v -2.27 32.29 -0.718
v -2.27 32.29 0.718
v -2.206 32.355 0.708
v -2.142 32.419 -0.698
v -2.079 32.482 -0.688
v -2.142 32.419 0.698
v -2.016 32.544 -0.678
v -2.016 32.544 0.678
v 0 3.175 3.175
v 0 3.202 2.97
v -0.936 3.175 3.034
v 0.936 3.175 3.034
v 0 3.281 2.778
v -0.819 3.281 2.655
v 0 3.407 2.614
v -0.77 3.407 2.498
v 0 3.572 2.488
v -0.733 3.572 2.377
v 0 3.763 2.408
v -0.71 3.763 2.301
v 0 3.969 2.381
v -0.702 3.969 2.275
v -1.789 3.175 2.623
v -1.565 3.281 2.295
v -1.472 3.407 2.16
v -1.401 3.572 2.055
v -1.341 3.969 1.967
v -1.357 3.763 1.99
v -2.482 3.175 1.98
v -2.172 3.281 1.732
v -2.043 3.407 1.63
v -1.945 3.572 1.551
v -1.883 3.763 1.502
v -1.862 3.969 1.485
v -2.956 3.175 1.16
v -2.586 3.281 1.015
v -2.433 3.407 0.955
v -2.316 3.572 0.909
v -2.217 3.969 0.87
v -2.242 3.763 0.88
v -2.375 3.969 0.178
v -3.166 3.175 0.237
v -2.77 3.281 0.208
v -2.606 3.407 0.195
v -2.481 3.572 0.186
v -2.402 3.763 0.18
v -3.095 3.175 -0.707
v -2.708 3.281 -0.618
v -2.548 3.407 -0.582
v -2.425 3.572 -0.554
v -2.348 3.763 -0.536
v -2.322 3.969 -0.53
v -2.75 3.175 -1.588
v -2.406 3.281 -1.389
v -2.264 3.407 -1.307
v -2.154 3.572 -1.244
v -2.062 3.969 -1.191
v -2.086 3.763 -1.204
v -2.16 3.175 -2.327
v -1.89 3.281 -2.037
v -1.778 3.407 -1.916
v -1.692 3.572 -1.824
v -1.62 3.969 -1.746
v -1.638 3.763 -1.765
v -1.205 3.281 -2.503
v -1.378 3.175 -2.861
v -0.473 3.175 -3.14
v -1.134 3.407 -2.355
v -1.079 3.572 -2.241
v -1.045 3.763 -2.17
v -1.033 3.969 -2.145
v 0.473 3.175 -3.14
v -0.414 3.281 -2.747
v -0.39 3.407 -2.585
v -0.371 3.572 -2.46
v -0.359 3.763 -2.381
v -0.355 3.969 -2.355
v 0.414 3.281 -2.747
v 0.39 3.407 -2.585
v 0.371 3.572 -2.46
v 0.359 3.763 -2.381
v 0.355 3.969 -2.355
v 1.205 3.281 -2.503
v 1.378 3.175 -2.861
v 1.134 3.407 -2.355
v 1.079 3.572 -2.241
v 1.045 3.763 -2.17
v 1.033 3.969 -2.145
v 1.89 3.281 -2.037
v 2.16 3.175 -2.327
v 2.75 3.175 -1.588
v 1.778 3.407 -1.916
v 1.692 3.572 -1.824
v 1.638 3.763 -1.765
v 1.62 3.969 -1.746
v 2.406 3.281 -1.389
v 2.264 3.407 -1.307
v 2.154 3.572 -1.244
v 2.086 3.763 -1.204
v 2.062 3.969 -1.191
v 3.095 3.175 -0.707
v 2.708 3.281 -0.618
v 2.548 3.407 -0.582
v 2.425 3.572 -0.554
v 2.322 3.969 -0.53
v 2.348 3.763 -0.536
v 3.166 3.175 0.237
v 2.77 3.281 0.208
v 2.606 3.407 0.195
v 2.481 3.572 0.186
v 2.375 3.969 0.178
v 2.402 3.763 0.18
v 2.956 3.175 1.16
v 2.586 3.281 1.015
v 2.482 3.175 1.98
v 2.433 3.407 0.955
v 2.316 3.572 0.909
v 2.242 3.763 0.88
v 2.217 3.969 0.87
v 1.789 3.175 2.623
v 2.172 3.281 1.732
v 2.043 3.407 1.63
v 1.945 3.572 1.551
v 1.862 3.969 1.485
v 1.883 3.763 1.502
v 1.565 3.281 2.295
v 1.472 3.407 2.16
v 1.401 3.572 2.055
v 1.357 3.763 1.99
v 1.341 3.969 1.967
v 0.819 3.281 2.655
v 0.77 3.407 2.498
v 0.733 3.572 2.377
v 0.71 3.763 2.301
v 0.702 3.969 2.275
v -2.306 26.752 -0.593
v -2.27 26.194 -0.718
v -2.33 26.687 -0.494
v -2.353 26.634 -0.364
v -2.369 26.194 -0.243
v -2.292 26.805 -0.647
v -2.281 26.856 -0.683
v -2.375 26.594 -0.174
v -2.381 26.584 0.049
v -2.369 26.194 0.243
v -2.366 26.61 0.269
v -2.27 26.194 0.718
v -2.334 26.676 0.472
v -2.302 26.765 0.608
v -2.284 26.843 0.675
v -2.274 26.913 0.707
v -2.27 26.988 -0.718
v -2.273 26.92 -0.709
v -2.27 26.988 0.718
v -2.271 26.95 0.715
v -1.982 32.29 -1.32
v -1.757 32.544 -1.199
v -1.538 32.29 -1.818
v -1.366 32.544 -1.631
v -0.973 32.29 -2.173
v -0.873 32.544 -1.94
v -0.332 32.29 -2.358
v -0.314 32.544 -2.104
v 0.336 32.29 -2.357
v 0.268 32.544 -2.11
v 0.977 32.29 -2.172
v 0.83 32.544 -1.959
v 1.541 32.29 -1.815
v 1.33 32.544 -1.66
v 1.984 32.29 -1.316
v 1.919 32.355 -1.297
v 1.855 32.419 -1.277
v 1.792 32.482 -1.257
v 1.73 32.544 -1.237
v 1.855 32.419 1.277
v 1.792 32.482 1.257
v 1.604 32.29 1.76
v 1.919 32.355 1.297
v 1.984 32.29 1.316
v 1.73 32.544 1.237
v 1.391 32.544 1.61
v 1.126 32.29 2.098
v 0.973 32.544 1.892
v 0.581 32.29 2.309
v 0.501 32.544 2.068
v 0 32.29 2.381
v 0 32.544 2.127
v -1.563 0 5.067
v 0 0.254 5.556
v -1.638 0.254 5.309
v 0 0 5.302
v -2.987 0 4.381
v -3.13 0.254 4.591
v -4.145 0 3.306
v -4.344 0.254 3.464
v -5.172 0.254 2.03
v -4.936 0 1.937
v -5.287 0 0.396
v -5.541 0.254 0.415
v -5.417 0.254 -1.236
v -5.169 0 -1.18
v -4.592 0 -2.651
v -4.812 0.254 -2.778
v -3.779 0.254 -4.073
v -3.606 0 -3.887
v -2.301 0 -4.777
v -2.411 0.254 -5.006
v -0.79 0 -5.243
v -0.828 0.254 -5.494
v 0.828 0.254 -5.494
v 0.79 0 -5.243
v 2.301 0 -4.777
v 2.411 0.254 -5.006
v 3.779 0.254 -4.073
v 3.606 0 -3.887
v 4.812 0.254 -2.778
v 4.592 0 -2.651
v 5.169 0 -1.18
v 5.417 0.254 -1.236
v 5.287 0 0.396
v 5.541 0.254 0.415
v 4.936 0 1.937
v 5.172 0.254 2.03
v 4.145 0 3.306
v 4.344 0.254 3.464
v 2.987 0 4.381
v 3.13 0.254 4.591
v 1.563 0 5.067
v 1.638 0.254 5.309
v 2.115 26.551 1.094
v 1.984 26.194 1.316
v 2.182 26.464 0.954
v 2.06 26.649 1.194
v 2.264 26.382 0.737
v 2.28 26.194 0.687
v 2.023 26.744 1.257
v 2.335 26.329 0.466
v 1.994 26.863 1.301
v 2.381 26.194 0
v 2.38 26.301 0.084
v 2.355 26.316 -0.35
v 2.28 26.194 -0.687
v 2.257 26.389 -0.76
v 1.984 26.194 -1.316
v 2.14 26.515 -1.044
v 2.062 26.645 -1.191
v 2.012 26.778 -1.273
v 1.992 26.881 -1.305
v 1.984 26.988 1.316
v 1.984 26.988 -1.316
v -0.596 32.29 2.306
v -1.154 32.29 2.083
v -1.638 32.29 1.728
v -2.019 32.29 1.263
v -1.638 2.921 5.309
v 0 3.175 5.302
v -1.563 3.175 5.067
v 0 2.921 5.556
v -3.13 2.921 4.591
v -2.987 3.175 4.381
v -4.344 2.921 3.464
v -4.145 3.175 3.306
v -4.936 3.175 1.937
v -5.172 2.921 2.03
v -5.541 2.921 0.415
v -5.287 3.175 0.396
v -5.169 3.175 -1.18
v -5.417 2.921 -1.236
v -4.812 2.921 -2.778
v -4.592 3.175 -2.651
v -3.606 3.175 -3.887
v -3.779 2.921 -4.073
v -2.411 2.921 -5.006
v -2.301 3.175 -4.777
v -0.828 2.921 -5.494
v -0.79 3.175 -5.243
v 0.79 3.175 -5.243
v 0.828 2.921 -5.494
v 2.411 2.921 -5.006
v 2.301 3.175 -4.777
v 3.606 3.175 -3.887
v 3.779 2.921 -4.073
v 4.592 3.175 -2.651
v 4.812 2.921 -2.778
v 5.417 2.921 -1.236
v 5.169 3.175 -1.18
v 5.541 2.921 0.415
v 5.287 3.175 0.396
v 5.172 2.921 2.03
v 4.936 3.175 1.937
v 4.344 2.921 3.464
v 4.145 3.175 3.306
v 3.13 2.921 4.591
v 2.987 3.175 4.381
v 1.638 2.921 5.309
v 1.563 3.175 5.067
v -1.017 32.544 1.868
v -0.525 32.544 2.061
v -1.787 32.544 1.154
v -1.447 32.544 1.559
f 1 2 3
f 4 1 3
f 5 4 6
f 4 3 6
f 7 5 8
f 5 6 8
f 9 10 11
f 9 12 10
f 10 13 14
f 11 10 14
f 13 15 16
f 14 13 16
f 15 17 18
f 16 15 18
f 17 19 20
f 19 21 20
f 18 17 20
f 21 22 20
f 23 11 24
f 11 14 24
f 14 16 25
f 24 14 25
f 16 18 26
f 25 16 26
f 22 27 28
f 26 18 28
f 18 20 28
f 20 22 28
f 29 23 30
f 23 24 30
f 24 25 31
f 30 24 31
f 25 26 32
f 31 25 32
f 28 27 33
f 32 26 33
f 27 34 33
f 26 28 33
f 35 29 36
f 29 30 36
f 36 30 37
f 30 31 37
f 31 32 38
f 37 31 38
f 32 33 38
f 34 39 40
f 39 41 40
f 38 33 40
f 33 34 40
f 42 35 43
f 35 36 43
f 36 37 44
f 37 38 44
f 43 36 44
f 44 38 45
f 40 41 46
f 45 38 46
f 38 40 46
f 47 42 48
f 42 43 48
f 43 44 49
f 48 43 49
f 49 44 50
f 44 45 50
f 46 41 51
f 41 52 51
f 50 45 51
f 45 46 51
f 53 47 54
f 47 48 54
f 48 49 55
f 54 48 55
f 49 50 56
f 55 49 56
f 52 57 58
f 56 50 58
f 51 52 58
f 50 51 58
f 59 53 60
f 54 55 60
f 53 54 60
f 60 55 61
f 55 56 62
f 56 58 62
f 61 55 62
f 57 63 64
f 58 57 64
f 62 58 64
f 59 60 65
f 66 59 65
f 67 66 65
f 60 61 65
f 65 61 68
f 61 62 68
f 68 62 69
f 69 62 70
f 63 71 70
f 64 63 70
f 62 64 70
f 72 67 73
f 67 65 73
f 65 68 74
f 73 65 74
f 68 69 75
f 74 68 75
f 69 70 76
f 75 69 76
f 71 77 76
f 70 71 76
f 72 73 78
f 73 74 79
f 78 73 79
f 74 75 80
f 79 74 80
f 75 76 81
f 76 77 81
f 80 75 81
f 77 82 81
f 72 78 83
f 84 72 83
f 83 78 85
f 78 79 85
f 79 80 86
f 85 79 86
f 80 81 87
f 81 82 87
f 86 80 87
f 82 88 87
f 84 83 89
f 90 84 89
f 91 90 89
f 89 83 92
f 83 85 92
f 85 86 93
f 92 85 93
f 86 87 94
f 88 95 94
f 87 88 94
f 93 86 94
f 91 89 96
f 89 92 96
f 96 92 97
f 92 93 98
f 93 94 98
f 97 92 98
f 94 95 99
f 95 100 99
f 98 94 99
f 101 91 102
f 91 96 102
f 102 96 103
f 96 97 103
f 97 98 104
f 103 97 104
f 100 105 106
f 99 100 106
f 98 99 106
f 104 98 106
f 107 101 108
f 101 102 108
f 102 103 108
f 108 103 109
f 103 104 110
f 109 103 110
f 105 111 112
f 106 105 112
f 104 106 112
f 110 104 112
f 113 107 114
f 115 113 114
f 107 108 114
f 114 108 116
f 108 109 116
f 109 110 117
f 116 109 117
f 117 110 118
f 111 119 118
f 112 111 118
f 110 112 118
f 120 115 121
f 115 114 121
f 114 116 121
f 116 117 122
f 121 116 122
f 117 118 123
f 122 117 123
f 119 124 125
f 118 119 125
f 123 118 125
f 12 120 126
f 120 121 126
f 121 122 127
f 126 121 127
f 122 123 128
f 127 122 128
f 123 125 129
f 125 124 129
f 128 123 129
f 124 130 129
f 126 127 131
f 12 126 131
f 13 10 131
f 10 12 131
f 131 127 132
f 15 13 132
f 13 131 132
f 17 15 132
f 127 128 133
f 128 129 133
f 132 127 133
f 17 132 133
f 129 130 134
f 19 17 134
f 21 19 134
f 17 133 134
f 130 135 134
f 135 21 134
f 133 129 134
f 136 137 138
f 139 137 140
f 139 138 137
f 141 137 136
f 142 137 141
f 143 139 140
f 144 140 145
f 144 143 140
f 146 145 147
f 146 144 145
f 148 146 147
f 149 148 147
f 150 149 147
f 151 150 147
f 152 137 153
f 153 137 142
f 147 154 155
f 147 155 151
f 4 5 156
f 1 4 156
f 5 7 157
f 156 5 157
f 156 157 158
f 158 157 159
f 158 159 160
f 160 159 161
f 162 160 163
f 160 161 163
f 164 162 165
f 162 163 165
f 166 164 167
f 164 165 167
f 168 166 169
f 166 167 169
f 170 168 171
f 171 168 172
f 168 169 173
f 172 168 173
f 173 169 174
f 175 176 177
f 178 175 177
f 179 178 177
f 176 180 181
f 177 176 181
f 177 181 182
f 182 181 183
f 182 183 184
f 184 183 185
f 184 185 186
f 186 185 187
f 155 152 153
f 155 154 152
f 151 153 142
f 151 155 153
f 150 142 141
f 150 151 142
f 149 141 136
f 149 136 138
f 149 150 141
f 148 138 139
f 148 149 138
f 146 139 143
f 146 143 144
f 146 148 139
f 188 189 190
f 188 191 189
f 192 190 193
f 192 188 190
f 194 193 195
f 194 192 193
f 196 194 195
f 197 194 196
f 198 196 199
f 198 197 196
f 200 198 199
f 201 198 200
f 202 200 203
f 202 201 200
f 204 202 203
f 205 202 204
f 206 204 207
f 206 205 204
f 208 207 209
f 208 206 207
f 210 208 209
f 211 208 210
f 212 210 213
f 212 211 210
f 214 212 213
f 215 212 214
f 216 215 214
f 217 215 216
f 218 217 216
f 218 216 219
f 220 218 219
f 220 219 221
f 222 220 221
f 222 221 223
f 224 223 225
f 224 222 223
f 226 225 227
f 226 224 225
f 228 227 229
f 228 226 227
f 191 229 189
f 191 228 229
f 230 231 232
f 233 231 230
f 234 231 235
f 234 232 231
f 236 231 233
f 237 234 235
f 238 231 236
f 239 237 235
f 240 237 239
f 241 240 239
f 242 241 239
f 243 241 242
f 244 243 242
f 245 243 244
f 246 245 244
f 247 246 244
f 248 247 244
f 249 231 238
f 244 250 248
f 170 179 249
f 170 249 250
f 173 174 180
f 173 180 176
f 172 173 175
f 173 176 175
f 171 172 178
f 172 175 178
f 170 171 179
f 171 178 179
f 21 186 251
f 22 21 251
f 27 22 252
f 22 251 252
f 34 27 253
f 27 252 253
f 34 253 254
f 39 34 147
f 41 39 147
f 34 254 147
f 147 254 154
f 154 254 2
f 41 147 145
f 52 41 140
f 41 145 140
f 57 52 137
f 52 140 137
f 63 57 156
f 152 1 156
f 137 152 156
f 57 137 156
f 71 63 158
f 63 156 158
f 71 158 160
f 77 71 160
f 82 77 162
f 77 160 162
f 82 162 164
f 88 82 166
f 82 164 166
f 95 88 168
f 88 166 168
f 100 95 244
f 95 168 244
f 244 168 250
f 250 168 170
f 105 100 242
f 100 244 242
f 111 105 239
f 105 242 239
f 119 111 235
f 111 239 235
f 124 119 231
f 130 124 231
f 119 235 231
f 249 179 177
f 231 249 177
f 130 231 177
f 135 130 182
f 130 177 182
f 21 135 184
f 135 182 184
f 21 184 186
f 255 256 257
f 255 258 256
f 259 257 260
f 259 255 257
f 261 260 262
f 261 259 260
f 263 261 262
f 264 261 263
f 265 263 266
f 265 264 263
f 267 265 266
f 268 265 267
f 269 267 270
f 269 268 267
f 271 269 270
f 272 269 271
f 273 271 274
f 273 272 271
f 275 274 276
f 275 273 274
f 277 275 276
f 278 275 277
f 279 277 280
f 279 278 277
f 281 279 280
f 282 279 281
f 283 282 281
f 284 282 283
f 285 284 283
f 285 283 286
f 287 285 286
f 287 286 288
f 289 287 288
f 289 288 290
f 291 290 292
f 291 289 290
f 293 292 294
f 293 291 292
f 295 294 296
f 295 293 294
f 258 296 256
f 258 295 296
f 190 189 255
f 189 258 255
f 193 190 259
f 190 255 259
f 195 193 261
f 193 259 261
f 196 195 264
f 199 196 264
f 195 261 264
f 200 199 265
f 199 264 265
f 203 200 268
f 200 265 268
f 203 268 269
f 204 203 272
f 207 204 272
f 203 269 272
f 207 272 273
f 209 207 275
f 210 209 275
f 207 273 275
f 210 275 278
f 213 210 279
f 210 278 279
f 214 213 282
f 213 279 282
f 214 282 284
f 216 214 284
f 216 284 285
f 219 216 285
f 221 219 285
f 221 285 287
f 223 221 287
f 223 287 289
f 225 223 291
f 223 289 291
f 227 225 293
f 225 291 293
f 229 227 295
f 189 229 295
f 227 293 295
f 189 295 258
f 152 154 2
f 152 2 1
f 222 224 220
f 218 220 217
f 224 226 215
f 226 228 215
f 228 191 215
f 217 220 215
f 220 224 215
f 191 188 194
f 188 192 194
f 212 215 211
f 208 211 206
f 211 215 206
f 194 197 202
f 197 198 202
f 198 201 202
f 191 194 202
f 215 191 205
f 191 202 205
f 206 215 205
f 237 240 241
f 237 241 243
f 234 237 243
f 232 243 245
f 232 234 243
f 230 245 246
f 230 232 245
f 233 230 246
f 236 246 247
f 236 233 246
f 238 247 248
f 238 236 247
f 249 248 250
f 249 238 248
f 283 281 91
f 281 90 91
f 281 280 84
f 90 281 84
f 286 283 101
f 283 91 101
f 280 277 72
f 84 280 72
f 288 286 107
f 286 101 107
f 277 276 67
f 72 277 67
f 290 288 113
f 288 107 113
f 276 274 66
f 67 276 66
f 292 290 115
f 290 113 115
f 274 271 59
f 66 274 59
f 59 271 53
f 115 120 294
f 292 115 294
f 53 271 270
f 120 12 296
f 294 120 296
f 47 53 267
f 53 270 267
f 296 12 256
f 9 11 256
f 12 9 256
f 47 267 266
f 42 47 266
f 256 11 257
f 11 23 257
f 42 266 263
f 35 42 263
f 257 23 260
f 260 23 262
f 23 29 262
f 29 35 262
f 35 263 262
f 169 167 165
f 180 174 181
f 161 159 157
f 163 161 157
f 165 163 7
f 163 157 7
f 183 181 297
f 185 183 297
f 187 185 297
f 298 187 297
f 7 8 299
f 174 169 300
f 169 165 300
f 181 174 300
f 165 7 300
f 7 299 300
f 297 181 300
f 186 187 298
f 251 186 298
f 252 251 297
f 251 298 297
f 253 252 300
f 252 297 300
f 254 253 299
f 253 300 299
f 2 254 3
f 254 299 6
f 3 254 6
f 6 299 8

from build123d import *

# Parameters (mm, degrees)
CUT_EXTRUDE1_DEPTH = 6.35
FILLET1_R          = 0.79375
FILLET2_R          = 0.79375
CHAMFER1_SIZE      = 0.254


with BuildPart() as part:
    # Sketch1 → Revolve1 (revolve)
    with BuildSketch(Plane.XY, mode=Mode.PRIVATE) as revolve1_sk:
        Polygon((0, 0), (5.55625, 0), (5.55625, 3.175), (2.38125, 3.175), (2.38125, 32.54375), (0, 32.54375), align=None)
    revolve(revolve1_sk.sketch.rotate(Axis((0, 3.469370861, 0), (0, -1, 0)), 90), axis=Axis((0, 3.469370861, 0), (0, -1, 0)))

    # Sketch4 → Cut-Extrude1 (cut)
    with BuildSketch(Plane(origin=(0, 32.54375, 0), x_dir=(1, 0, 0), z_dir=(0, 1, 0))):
        with BuildLine():
            Line((-2.270399729, -0.71807843), (-2.270399729, 0.71807843))
            ThreePointArc((-2.270399729, 0.71807843), (-2.38125, 0), (-2.270399729, -0.71807843))
        make_face()
        with BuildLine():
            Line((1.984375, -1.316285464), (1.984375, 1.316285464))
            ThreePointArc((1.984375, 1.316285464), (2.38125, 0), (1.984375, -1.316285464))
        make_face()
    extrude(amount=-CUT_EXTRUDE1_DEPTH, mode=Mode.SUBTRACT)

    # Fillet1
    fillet1_edges = [part.edges().sort_by_distance(p)[0] for p in [
        (0, 3.175, -2.38125),
    ]]
    fillet(fillet1_edges, radius=FILLET1_R)

    # Fillet2
    # the kernel refuses this fillet: 0.79375 mm, written as the material it adds along each edge
    with BuildSketch(Plane(origin=(1.984375, 26.19375, 3.300660464), x_dir=(0, 1, 0), z_dir=(0, 0, -1))) as fillet2_piece_1_section:
        with BuildLine():
            CenterArc((FILLET2_R, FILLET2_R), FILLET2_R, 180, 90)
            Line((0, FILLET2_R), (0, 0))
            Line((0, 0), (FILLET2_R, 0))
        make_face()
    fillet2_piece_1 = extrude(amount=6.601320927, mode=Mode.PRIVATE)
    fillet2_piece_1 = fillet2_piece_1 & Plane(origin=(0, 26.406315187, 0), x_dir=(0, 0, 1), z_dir=(0, 1, 0)) * Cylinder(2.38125, 17, mode=Mode.PRIVATE)
    add(fillet2_piece_1)
    with BuildSketch(Plane(origin=(-2.270399729, 26.19375, 2.70245343), x_dir=(0, 1, 0), z_dir=(0, 0, -1))) as fillet2_piece_2_section:
        with BuildLine():
            CenterArc((FILLET2_R, -FILLET2_R), FILLET2_R, 90, 90)
            Line((0, -FILLET2_R), (0, 0))
            Line((0, 0), (FILLET2_R, 0))
        make_face()
    fillet2_piece_2 = extrude(amount=5.404906861, mode=Mode.PRIVATE)
    fillet2_piece_2 = fillet2_piece_2 & Plane(origin=(0, 26.476974143, 0), x_dir=(0, 0, 1), z_dir=(0, 1, 0)) * Cylinder(2.38125, 14, mode=Mode.PRIVATE)
    add(fillet2_piece_2)

    # Chamfer1
    # the kernel refuses this chamfer: 0.254 mm, written as the material it takes off along each edge
    with BuildSketch(Plane(origin=(0, 32.54375, 0), x_dir=(-0.9994949156693064, 0, -0.03177913704312948), z_dir=(-0.03177913704312948, 0, 0.9994949156693064))) as chamfer1_piece_1:
        Polygon((2.38125, CHAMFER1_SIZE), (2.38125 - CHAMFER1_SIZE, 0), (2.38125, 0), align=None)
    revolve(axis=Axis((0, 32.54375, 0), (0, -1, 0)), revolution_arc=160.351494941, mode=Mode.SUBTRACT)
    with BuildSketch(Plane(origin=(0, 32.54375, 0), x_dir=(0, 0, 1), z_dir=(1, 0, 0))) as chamfer1_piece_2:
        Polygon((2.38125, CHAMFER1_SIZE), (2.38125 - CHAMFER1_SIZE, 0), (2.38125, 0), align=None)
    revolve(axis=Axis((0, 32.54375, 0), (0, -1, 0)), revolution_arc=88.170020766, mode=Mode.SUBTRACT)
    with BuildSketch(Plane(origin=(1.984375, 32.54375, 1.969492943), x_dir=(-0.9996219169112972, 0.027495876610573698, 0), z_dir=(0, 0, -1))) as chamfer1_piece_3:
        Polygon((CHAMFER1_SIZE * 0.999621916911, -CHAMFER1_SIZE * 0.0274958766106), (-CHAMFER1_SIZE * 0.0274958766106, -CHAMFER1_SIZE * 0.999621916911), (0, 0), align=None)
    extrude(amount=3.938985885, mode=Mode.SUBTRACT)
    with BuildSketch(Plane(origin=(-2.270399729, 32.54375, 1.371285909), x_dir=(-0.027495876610587867, -0.9996219169112968, 0), z_dir=(0, 0, -1))) as chamfer1_piece_4:
        Polygon((CHAMFER1_SIZE * 0.999621916911, -CHAMFER1_SIZE * 0.0274958766106), (-CHAMFER1_SIZE * 0.0274958766106, -CHAMFER1_SIZE * 0.999621916911), (0, 0), align=None)
    extrude(amount=2.742571819, mode=Mode.SUBTRACT)
    with BuildSketch(Plane(origin=(0, 3.175, 0), x_dir=(0, 0, 1), z_dir=(1, 0, 0))) as chamfer1_piece_5:
        Polygon((5.55625 - CHAMFER1_SIZE, 0), (5.55625, CHAMFER1_SIZE), (5.55625, 0), align=None)
    revolve(axis=Axis((0, 3.175, 0), (0, -1, 0)), mode=Mode.SUBTRACT)
    with BuildSketch(Plane(origin=(0, 0, 0), x_dir=(0, 0, 1), z_dir=(1, 0, 0))) as chamfer1_piece_6:
        Polygon((5.55625, -CHAMFER1_SIZE), (5.55625 - CHAMFER1_SIZE, 0), (5.55625, 0), align=None)
    revolve(axis=Axis((0, 0, 0), (0, -1, 0)), mode=Mode.SUBTRACT)
    with BuildSketch(Plane(origin=(0, 32.54375, 0), x_dir=(0.9519271960907222, 0, 0.3063243596954961), z_dir=(0.3063243596954961, 0, -0.9519271960907222))) as chamfer1_piece_7:
        Polygon((2.38125, CHAMFER1_SIZE), (2.38125 - CHAMFER1_SIZE, 0), (2.38125, 0), align=None)
    revolve(axis=Axis((0, 32.54375, 0), (0, -1, 0)), revolution_arc=72.162141692, mode=Mode.SUBTRACT)


solid = part.part
